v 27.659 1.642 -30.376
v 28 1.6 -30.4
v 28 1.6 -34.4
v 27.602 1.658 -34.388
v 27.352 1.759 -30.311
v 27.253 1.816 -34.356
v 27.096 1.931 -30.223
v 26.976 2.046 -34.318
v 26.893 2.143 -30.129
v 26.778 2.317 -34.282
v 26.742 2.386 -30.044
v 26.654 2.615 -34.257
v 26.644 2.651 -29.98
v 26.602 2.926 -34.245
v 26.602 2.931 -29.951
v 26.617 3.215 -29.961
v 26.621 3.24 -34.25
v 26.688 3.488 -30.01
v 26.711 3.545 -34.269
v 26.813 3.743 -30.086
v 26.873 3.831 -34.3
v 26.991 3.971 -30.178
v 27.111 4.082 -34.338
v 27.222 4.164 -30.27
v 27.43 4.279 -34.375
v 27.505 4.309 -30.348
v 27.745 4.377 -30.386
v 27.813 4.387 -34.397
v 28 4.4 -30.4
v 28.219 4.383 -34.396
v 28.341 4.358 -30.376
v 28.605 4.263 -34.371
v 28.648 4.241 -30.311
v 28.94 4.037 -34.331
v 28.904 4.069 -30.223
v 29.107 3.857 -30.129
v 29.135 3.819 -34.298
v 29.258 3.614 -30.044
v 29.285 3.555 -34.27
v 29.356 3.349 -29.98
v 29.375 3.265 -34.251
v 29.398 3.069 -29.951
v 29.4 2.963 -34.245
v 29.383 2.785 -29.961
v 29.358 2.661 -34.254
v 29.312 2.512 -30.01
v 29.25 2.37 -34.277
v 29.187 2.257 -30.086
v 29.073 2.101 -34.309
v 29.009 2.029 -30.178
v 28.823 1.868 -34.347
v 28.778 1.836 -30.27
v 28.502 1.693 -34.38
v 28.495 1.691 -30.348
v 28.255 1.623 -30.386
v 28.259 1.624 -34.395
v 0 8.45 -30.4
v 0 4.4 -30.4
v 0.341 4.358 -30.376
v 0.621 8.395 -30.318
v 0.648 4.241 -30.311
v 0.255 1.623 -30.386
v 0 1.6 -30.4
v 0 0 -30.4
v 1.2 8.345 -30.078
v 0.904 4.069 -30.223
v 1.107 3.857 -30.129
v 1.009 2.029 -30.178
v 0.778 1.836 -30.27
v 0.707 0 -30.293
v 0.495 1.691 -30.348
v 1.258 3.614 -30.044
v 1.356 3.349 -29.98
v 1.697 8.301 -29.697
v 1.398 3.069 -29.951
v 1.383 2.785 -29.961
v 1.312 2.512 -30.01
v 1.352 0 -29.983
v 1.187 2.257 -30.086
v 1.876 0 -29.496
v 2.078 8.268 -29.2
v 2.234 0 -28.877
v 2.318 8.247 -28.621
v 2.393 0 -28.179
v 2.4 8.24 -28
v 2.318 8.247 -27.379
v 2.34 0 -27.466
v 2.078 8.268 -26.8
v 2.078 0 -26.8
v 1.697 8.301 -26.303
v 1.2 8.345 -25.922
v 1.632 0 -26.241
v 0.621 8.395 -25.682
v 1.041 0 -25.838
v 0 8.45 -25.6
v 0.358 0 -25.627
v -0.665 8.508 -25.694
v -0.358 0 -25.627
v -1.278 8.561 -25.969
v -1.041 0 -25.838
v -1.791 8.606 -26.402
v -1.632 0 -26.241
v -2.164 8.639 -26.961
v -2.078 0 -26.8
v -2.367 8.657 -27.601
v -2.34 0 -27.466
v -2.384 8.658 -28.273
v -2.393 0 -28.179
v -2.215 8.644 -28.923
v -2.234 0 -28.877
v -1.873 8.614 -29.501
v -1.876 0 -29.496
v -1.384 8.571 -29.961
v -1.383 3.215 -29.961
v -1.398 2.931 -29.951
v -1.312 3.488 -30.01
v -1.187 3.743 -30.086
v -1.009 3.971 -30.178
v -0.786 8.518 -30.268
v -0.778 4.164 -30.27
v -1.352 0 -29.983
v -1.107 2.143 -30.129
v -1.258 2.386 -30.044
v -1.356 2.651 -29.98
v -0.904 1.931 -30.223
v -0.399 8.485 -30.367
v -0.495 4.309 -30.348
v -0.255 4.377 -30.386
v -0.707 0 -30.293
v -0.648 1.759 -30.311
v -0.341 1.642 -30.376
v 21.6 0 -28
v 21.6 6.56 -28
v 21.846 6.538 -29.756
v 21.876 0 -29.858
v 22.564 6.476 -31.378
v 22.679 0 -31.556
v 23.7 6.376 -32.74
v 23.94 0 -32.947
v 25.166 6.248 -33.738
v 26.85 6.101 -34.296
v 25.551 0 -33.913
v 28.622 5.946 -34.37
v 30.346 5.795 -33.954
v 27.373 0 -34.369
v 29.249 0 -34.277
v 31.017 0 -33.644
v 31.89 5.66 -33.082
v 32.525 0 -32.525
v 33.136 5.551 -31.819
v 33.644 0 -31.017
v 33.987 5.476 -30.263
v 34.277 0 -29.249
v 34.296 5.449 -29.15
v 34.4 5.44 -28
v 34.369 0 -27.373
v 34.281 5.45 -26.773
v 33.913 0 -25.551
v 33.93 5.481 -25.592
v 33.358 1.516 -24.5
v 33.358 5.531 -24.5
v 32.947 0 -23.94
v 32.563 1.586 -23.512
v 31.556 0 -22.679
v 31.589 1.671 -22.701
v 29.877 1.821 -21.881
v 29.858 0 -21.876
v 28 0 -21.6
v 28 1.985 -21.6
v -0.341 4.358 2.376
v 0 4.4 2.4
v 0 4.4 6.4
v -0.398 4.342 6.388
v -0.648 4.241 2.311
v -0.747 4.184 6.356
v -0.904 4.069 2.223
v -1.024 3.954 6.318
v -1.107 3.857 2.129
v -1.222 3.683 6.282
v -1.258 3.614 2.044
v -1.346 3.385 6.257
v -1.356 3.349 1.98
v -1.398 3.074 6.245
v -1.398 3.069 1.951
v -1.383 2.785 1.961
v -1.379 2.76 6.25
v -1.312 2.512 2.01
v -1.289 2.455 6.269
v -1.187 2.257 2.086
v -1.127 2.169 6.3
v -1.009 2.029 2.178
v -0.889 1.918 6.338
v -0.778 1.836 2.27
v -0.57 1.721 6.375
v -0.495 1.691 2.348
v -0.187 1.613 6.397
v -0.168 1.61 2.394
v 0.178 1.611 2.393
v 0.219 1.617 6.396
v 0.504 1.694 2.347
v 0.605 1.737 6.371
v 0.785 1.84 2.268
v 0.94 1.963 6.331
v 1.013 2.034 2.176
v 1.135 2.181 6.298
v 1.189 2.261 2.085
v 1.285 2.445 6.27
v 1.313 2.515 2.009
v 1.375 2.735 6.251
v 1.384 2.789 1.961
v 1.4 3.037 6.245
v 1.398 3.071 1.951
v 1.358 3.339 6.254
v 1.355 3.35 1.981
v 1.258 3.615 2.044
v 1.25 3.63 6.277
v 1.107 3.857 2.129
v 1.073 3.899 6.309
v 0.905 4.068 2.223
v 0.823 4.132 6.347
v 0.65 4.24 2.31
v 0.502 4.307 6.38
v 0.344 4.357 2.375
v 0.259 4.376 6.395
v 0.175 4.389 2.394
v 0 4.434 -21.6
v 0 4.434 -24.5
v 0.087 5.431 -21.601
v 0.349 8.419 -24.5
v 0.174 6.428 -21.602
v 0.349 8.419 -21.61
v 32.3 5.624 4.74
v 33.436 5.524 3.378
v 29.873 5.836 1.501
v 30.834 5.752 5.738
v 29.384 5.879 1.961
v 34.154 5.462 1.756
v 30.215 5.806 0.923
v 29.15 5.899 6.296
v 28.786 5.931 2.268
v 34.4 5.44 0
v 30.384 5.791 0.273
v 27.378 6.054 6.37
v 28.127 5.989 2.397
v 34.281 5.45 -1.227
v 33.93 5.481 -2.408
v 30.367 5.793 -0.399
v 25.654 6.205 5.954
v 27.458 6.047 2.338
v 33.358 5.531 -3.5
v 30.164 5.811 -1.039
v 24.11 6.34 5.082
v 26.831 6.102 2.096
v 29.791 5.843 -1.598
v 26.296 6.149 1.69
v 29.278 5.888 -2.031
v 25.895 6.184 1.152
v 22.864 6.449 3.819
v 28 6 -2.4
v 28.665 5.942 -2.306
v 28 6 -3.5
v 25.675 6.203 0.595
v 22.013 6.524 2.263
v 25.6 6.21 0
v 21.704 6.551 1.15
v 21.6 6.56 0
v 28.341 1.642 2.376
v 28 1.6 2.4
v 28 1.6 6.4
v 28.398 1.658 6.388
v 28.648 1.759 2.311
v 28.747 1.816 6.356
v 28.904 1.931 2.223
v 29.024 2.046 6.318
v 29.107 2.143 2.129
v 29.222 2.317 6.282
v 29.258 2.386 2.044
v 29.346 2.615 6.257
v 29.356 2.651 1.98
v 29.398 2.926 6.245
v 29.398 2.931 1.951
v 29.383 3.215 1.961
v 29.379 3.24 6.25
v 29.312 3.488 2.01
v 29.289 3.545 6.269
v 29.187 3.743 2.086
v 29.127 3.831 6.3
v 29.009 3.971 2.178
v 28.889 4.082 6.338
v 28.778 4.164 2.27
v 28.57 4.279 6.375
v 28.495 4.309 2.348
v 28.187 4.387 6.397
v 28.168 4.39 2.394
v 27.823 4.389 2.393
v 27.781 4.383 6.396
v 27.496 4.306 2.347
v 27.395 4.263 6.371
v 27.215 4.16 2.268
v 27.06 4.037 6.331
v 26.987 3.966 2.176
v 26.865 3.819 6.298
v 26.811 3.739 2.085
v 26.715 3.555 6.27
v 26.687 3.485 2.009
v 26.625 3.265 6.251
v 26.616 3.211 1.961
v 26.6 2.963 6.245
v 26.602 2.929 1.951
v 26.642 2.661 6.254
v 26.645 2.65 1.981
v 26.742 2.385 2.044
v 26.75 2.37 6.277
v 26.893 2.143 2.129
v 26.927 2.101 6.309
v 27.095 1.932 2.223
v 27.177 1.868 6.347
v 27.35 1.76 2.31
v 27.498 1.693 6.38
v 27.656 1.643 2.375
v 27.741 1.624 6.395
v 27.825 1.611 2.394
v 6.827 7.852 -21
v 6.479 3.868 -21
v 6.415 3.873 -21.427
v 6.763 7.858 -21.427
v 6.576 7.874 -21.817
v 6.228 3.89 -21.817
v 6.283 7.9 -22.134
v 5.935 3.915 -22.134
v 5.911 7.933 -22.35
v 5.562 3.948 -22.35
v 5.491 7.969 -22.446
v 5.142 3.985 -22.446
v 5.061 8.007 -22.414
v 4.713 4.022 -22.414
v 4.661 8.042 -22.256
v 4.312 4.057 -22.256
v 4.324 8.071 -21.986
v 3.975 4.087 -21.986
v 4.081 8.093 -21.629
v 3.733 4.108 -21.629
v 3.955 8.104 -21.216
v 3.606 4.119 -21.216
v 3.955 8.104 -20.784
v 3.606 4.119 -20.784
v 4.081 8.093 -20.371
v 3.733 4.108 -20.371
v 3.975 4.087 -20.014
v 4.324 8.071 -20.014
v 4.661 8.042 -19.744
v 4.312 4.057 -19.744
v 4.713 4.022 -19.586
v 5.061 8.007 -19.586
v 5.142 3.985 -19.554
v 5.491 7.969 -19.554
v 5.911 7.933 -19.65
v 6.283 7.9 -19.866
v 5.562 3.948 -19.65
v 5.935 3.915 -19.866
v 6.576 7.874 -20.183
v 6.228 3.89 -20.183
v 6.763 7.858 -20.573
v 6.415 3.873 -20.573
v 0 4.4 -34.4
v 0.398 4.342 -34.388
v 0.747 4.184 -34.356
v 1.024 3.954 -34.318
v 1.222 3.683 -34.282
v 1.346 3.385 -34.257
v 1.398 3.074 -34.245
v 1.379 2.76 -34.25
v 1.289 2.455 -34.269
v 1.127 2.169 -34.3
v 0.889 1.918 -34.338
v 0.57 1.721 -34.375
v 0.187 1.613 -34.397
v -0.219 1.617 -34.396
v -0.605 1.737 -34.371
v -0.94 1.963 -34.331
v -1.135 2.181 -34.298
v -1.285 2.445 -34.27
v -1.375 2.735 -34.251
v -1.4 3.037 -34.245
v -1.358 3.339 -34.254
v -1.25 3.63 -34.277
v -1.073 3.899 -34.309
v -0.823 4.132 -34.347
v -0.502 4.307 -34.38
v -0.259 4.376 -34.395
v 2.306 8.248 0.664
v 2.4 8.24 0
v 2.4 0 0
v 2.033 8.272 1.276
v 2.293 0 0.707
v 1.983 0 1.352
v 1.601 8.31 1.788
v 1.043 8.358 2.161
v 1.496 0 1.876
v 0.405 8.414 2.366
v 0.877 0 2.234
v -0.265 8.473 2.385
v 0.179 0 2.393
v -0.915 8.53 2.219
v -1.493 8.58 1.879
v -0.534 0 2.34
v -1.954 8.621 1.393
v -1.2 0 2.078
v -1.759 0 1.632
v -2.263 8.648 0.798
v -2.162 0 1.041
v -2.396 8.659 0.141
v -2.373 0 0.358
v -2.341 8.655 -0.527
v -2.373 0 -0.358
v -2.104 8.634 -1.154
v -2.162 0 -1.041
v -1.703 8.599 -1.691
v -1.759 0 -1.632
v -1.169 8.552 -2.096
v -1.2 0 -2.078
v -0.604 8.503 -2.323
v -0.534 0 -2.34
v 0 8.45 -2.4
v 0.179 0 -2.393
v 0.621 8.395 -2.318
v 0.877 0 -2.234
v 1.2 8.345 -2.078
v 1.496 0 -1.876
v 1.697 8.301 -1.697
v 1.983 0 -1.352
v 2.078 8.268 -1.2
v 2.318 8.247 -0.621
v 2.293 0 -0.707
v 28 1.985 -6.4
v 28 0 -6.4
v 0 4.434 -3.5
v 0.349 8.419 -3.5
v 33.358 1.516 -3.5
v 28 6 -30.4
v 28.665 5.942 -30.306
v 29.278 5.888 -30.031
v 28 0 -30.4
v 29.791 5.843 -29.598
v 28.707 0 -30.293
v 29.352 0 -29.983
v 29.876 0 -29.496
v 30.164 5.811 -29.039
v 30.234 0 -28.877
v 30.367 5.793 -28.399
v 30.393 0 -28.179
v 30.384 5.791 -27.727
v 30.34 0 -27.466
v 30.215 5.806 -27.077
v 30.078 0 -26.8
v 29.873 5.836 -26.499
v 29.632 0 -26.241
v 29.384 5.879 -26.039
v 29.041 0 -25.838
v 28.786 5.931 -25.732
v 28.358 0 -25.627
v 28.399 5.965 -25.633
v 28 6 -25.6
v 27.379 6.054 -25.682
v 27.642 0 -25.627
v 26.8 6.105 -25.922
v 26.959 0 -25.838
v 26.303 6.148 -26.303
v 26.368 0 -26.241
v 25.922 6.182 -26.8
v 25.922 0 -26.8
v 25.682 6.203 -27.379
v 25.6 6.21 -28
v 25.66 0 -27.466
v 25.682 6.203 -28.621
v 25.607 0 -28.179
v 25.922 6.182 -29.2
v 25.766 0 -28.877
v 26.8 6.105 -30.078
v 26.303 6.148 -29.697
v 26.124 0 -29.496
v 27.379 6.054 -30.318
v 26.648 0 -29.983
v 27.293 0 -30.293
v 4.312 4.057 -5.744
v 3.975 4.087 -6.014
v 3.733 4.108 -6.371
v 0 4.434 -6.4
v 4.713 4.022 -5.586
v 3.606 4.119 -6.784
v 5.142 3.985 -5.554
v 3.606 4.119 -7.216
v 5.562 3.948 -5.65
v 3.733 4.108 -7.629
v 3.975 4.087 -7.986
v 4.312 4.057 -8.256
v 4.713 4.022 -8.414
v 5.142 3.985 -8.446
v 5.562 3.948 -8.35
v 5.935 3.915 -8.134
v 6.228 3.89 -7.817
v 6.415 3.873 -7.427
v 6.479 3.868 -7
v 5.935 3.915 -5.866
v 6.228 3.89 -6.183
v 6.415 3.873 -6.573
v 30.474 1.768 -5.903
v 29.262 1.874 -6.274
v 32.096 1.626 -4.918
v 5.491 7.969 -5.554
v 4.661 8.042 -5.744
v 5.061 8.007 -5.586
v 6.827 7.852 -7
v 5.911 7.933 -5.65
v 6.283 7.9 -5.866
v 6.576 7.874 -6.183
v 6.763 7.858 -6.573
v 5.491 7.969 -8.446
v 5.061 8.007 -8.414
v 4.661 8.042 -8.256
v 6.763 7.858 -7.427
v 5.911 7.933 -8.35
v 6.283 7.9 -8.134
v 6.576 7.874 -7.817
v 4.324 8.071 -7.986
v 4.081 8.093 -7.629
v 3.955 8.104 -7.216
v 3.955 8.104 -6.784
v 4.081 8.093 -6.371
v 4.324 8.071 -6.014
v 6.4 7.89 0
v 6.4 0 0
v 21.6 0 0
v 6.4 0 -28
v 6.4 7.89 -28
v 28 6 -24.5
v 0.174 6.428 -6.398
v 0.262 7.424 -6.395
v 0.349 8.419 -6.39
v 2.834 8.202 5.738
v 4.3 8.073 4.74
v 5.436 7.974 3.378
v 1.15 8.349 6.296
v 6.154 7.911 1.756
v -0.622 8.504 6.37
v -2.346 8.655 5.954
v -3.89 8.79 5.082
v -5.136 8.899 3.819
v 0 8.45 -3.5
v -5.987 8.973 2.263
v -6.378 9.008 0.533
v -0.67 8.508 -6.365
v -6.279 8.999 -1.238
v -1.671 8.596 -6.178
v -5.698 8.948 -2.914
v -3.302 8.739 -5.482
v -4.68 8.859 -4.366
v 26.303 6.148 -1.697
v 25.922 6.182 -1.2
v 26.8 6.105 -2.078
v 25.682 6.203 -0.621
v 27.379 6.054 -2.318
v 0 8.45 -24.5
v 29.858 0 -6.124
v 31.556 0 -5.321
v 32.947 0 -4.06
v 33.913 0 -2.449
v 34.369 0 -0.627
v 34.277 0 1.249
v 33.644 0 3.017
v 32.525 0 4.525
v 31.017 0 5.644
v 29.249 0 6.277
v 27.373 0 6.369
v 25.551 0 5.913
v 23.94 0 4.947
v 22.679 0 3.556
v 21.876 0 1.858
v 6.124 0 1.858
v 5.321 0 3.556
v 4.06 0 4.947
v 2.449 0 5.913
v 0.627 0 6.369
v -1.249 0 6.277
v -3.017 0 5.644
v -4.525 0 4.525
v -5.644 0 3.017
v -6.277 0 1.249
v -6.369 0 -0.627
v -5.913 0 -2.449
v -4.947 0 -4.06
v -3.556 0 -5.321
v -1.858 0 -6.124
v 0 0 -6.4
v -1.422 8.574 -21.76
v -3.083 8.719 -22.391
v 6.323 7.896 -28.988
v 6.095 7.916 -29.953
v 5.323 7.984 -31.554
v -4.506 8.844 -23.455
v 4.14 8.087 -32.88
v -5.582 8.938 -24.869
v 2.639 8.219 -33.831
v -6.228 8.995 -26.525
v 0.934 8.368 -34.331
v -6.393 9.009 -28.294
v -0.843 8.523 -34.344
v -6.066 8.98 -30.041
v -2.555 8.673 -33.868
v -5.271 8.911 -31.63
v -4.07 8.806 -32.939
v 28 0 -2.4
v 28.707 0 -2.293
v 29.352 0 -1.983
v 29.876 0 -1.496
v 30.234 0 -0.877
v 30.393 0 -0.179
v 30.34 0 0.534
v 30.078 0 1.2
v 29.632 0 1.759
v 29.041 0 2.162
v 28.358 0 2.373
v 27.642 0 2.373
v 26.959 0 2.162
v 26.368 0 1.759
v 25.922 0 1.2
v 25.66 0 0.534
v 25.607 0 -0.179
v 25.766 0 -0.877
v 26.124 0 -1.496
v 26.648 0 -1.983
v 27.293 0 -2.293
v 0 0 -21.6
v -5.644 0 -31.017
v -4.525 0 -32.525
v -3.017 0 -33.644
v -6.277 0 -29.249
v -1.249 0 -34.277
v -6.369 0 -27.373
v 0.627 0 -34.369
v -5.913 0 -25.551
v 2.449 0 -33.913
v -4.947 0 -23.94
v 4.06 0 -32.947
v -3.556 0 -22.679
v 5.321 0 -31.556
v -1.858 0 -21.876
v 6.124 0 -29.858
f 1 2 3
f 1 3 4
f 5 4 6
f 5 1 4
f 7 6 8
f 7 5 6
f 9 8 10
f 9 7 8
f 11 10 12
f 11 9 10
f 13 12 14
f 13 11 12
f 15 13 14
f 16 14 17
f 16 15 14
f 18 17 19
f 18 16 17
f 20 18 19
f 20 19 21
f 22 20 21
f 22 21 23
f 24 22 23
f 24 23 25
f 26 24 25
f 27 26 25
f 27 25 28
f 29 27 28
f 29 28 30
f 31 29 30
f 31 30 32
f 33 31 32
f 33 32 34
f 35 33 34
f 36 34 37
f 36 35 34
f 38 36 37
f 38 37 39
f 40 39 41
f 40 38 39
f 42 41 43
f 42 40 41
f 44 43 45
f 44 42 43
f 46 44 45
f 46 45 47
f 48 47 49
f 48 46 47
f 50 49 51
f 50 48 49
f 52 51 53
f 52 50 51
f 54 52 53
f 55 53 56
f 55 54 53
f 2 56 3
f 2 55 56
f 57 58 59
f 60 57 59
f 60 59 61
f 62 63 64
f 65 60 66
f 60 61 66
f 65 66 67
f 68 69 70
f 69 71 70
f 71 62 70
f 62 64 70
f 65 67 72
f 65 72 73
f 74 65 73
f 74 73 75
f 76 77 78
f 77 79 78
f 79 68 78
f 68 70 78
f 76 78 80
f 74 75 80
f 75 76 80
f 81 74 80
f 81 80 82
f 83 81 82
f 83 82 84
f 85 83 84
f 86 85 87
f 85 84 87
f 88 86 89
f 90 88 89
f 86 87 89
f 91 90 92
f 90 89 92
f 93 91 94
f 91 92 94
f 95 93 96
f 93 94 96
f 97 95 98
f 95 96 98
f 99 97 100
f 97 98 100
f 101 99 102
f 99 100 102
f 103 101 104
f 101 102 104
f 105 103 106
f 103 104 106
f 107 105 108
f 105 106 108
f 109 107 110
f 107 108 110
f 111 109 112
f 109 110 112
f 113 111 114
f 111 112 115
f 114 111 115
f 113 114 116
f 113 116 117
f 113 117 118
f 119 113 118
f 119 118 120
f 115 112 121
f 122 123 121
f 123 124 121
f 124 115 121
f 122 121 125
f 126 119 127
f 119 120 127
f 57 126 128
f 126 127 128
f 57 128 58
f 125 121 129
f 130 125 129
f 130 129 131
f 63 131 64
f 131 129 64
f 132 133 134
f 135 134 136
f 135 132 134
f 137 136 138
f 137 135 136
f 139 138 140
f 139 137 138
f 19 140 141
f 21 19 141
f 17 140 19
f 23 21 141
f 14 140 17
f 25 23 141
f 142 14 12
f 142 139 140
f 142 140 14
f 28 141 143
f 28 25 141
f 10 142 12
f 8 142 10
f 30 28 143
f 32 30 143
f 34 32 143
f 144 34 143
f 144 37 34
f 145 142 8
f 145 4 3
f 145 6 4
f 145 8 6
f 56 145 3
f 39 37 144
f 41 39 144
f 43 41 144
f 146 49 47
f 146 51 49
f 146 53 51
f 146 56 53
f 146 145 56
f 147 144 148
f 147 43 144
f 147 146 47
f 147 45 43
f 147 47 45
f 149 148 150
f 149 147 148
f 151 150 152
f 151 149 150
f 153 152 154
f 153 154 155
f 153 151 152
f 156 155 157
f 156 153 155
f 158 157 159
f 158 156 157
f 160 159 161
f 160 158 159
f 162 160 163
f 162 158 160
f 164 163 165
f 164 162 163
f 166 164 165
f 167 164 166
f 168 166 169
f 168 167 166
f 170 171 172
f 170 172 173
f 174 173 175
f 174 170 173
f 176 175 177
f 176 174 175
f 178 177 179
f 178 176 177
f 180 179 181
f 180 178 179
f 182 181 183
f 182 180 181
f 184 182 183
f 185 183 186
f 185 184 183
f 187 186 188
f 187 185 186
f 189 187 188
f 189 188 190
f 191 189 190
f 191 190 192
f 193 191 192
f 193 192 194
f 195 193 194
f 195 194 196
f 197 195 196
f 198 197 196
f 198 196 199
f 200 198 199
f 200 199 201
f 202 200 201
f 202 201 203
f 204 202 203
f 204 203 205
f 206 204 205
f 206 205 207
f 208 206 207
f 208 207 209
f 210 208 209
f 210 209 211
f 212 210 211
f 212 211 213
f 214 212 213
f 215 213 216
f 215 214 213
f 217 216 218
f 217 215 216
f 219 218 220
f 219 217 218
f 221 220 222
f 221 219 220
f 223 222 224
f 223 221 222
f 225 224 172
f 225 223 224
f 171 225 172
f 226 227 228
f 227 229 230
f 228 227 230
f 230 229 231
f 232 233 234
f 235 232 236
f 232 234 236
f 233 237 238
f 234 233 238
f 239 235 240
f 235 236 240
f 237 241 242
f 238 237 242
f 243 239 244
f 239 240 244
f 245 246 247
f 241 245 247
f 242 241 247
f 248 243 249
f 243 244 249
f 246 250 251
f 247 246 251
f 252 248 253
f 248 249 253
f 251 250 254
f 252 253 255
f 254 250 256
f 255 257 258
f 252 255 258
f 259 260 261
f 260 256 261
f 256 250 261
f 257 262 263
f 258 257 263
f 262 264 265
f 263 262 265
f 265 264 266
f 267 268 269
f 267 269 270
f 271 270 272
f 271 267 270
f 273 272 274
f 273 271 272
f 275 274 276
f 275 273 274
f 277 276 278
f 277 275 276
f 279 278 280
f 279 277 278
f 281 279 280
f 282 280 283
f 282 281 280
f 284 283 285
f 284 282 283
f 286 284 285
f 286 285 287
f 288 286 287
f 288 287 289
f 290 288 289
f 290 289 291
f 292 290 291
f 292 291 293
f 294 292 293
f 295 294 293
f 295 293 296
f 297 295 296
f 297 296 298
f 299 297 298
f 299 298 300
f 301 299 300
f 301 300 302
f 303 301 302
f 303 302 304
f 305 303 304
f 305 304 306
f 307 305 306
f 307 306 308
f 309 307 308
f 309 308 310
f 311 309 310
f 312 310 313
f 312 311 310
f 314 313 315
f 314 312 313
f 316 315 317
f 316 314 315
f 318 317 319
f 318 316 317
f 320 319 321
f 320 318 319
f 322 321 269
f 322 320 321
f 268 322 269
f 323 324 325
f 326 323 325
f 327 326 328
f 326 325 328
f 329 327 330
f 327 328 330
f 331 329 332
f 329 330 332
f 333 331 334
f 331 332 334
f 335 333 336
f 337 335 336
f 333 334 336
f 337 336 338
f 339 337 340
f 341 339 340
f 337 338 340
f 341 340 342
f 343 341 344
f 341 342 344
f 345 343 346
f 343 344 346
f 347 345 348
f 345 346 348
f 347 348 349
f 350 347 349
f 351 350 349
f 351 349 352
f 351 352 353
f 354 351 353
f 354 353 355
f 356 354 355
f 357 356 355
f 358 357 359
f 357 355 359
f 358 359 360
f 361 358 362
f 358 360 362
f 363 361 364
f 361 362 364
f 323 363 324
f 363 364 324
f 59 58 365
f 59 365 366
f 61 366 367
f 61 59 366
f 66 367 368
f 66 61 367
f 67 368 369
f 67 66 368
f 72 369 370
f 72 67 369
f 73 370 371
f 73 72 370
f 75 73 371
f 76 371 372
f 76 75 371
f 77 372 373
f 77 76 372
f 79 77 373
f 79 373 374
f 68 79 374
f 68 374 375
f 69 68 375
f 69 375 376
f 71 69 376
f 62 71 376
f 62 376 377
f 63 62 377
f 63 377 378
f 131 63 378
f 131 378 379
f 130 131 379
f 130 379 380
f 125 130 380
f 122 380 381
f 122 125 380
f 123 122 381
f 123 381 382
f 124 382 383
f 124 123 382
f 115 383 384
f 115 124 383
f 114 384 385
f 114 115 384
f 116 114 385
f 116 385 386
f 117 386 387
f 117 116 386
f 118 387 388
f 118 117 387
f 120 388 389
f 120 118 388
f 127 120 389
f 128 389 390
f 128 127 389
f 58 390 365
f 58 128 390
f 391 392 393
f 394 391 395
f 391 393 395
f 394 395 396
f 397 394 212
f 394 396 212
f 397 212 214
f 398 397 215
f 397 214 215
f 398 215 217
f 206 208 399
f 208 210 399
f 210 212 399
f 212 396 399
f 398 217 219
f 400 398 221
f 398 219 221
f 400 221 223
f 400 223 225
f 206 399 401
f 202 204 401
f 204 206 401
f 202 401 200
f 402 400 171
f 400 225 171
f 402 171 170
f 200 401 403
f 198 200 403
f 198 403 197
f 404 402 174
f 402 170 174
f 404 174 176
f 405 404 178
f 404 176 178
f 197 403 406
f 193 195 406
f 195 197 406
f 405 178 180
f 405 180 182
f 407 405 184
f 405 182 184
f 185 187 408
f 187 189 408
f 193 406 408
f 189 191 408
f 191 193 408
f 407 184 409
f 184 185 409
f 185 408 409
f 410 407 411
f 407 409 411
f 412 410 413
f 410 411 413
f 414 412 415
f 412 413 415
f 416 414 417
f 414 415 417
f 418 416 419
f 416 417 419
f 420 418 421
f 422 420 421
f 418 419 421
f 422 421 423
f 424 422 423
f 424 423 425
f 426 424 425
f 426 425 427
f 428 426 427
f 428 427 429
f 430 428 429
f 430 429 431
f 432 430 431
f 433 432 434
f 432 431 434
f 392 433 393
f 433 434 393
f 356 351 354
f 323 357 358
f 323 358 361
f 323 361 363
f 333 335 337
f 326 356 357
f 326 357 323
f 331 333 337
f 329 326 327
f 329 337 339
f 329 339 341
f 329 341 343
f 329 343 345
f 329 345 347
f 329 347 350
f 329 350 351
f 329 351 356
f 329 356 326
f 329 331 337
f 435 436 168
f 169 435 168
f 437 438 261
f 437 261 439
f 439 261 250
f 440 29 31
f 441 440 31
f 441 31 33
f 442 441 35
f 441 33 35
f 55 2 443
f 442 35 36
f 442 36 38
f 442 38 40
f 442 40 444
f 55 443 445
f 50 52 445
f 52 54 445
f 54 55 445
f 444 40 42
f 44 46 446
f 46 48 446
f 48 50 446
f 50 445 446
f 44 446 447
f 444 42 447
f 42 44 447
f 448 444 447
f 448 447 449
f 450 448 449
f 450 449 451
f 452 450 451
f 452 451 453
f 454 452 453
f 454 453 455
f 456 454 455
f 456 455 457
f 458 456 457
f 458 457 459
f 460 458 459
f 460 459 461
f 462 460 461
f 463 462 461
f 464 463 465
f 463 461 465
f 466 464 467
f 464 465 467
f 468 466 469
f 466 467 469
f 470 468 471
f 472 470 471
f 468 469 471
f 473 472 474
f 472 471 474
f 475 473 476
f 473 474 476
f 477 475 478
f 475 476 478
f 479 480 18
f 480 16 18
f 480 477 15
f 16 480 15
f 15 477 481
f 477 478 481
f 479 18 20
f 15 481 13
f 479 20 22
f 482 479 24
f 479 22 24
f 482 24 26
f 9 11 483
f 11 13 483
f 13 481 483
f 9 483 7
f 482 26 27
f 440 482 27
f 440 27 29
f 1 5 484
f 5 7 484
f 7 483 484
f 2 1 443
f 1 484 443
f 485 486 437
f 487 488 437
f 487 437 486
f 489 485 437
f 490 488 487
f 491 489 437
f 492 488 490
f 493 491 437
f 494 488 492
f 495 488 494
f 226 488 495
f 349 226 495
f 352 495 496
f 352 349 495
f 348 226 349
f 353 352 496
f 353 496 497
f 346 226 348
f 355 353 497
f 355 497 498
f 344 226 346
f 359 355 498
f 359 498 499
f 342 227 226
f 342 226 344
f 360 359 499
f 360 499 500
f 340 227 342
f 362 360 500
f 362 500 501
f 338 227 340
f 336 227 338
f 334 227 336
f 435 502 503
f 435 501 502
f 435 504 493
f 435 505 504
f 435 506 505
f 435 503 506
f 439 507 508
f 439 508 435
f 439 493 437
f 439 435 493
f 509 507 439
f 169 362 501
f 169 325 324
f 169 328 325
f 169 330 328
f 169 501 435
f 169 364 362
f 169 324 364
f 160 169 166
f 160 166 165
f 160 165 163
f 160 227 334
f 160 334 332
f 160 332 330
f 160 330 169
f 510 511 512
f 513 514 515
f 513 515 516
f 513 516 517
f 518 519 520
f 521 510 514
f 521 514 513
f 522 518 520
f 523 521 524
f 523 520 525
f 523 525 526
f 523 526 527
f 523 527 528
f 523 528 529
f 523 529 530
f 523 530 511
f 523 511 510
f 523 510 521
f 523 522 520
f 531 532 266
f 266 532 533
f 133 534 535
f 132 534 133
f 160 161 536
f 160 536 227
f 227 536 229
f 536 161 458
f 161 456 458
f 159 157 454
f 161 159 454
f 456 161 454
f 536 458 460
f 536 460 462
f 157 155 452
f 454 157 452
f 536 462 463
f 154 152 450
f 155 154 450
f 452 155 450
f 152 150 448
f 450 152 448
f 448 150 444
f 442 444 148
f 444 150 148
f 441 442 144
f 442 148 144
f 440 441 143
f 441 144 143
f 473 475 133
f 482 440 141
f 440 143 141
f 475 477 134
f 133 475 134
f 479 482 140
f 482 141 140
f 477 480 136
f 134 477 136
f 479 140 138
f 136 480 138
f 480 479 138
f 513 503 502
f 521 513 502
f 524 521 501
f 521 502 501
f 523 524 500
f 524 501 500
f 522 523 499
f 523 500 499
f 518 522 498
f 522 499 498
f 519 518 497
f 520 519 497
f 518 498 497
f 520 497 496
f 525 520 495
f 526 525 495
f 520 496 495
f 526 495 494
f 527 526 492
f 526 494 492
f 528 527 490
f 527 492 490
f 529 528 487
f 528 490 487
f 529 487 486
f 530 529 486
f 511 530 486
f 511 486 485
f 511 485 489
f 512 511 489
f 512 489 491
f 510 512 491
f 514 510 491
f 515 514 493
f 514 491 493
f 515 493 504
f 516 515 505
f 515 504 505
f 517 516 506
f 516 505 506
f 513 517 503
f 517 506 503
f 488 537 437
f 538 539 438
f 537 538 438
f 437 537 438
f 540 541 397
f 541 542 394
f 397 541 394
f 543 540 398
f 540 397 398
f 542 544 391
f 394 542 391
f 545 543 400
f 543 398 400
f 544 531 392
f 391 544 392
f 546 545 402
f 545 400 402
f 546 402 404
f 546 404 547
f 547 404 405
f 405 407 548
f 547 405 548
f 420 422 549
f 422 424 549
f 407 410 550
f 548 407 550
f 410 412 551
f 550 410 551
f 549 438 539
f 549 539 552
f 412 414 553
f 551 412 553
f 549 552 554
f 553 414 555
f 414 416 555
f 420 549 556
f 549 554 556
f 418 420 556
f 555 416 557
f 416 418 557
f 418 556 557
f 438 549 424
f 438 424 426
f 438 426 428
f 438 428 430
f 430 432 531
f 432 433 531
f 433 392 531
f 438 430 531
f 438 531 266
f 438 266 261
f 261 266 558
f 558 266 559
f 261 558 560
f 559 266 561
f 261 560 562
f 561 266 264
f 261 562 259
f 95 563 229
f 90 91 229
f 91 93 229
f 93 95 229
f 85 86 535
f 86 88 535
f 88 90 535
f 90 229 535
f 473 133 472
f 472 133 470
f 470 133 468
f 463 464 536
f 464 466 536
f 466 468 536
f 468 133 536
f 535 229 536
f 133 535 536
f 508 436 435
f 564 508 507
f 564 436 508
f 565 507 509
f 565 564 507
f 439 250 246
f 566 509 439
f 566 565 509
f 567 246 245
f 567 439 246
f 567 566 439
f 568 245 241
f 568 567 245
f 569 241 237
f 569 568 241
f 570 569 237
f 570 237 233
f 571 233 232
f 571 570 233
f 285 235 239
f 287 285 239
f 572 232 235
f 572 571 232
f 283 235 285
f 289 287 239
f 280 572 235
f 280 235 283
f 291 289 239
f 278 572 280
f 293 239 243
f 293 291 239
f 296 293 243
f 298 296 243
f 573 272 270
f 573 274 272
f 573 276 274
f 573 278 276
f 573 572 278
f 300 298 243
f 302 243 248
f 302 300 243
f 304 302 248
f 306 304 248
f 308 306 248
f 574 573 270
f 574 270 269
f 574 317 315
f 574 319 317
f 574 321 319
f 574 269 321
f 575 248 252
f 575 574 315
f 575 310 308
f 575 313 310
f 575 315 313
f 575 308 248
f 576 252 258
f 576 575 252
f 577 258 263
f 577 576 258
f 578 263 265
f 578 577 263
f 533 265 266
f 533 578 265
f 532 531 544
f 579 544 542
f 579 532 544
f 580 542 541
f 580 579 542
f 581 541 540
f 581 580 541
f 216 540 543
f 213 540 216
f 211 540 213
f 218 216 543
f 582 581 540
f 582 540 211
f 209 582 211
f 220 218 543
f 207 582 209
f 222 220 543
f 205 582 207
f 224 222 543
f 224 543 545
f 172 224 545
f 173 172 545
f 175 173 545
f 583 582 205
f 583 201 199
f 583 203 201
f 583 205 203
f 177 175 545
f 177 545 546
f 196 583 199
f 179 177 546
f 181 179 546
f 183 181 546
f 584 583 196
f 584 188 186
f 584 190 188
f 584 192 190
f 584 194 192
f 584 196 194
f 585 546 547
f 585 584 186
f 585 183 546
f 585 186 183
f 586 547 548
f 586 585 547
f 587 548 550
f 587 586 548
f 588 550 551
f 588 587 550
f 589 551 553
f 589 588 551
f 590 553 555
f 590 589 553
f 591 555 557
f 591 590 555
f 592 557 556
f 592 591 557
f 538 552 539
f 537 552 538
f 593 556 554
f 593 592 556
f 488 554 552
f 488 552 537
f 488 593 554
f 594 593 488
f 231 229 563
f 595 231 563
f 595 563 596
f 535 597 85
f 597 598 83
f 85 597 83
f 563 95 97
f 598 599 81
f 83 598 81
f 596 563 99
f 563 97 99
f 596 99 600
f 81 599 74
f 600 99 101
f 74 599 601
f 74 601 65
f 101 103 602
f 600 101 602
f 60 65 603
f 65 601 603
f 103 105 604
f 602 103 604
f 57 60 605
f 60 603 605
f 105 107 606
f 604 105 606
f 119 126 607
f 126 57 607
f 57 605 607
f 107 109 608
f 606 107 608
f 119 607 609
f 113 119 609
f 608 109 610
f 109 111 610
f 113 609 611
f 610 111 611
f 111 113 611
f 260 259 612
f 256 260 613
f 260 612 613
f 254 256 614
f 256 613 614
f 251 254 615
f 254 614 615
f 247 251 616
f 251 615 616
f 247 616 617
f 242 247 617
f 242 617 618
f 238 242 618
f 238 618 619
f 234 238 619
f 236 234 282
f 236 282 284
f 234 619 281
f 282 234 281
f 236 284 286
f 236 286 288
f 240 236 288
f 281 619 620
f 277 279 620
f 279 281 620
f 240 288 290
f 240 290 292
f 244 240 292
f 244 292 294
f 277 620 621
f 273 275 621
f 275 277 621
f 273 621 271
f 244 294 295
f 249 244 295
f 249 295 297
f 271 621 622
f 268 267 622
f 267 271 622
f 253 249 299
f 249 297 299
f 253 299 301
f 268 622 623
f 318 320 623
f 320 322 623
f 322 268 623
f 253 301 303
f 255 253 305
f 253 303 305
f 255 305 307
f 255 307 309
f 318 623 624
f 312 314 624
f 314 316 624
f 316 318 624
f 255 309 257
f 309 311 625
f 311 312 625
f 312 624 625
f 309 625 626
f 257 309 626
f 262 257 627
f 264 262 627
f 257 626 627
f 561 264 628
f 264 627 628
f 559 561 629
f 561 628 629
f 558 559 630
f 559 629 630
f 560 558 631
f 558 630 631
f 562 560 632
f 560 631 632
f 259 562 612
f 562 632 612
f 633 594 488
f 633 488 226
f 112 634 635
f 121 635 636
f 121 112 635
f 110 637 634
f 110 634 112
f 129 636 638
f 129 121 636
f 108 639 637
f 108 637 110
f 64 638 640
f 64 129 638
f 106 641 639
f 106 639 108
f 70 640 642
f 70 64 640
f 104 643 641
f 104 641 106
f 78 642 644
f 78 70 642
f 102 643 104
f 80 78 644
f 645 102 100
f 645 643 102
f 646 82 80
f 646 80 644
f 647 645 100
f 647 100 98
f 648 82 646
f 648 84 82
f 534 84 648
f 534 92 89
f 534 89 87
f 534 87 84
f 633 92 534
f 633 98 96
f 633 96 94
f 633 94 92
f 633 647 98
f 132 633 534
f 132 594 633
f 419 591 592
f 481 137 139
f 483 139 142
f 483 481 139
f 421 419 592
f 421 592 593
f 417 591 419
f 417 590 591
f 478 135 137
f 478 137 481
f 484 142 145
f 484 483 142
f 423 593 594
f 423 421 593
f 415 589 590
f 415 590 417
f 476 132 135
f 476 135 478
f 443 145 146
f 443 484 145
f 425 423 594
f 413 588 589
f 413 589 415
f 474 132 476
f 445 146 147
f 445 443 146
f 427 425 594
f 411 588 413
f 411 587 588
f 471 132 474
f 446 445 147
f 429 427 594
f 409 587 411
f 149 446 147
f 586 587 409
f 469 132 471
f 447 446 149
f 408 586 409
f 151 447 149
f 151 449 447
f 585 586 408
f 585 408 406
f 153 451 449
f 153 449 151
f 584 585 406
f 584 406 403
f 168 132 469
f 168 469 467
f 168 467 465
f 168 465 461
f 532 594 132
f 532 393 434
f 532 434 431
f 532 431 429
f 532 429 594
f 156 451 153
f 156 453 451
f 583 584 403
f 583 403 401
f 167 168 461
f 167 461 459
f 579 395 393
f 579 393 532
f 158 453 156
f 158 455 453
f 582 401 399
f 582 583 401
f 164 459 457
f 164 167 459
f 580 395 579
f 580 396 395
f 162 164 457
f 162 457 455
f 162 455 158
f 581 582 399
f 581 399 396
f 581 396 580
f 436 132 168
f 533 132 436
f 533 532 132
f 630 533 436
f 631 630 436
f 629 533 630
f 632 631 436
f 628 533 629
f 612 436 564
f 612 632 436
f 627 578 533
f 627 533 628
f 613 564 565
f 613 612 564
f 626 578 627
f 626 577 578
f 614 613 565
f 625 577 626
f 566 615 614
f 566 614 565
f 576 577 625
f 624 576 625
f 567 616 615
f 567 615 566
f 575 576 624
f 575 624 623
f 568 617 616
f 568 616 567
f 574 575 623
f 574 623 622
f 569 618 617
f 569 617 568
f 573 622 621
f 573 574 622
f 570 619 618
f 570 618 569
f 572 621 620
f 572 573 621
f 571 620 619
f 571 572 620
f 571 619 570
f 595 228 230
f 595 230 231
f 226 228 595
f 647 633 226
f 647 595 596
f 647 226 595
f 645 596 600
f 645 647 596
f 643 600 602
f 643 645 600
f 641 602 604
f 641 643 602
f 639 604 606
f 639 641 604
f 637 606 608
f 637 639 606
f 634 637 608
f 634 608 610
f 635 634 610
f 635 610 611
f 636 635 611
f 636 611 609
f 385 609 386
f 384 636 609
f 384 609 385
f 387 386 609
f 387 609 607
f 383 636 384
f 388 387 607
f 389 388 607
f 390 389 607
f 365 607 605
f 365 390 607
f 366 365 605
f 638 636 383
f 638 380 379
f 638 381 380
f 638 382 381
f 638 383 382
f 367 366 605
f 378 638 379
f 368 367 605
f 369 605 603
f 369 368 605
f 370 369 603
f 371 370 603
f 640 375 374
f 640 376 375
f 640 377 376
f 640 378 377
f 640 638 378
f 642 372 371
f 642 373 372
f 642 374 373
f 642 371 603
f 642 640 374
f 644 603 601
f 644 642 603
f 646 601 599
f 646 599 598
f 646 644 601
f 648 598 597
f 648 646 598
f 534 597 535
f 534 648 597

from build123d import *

# Parameters (mm, degrees)
SKETCH1_W           = 28
SKETCH1_H           = 28
BOSS_EXTRUDE1_DEPTH = 8.449682579
CUT_EXTRUDE1_DEPTH  = 41.489469442
SKETCH3_W           = 50
SKETCH3_H           = 21
CUT_EXTRUDE2_DEPTH  = 4
SKETCH11_R          = 1.45
BOSS_EXTRUDE2_DEPTH = 4
SKETCH13_R          = 2.4
CUT_EXTRUDE5_DEPTH  = 41.489469442
BOSS_EXTRUDE3_REACH = 42.489
SKETCH14_R          = 6.4
SKETCH14_R_2        = 2.4
SKETCH15_R          = 1.4
CUT_EXTRUDE6_DEPTH  = 50.476186927
SKETCH16_R          = 1.4
CUT_EXTRUDE7_DEPTH  = 50.476187084
SKETCH18_W          = 30
SKETCH18_H          = 21
CUT_EXTRUDE8_DEPTH  = 4


with BuildPart() as part:
    # Sketch1 → Boss-Extrude1 (new body)
    with BuildSketch(Plane(origin=(0, 0, 0), x_dir=(1, 0, 0), z_dir=(0, 1, 0))):
        with Locations((14, 14)):
            Rectangle(SKETCH1_W, SKETCH1_H)
    extrude(amount=BOSS_EXTRUDE1_DEPTH)

    # Sketch2 → Cut-Extrude1 (cut, through all)
    with BuildSketch(Plane.XY):
        Polygon((0, 8.449682579), (28, 6), (28, 8.449682579), align=None)
    extrude(amount=-CUT_EXTRUDE1_DEPTH, mode=Mode.SUBTRACT)

    # Sketch3 → Cut-Extrude2 (cut)
    with BuildSketch(Plane(origin=(0.733635991, 8.385497746, 0), x_dir=(0.9961946980917455, -0.08715574274765811, 0), z_dir=(0.08715574274765811, 0.9961946980917455, 0))):
        with Locations((24.263561639, 14)):
            Rectangle(SKETCH3_W, SKETCH3_H)
    extrude(amount=-CUT_EXTRUDE2_DEPTH, mode=Mode.SUBTRACT)

    # Sketch11 → Boss-Extrude2 (add)
    with BuildSketch(Plane(origin=(0.38501302, 4.400718954, 0), x_dir=(0.9961946980917457, -0.08715574274765812, 0), z_dir=(0.08715574274765812, 0.9961946980917457, 0))):
        with Locations((4.666994019, 21)):
            Circle(SKETCH11_R)
        with Locations((4.666994019, 7)):
            Circle(SKETCH11_R)
    extrude(amount=BOSS_EXTRUDE2_DEPTH)

    # Sketch13 → Cut-Extrude5 (cut, through all)
    with BuildSketch(Plane.XZ):
        Circle(SKETCH13_R)
        with Locations((28, 0)):
            Circle(SKETCH13_R)
        with Locations((28, -28)):
            Circle(SKETCH13_R)
        with Locations((0, -28)):
            Circle(SKETCH13_R)
    extrude(amount=-CUT_EXTRUDE5_DEPTH, mode=Mode.SUBTRACT)

    # Boss-Extrude3: up to this plane
    boss_extrude3_end = Plane(origin=(0, 8.449682579, -28), z_dir=(-0.08715574274765814, -0.9961946980917457, 0))
    # Sketch14 → Boss-Extrude3 (add, up to the surface)
    with BuildSketch(Plane.XZ, mode=Mode.PRIVATE) as boss_extrude3_sk1:
        Circle(SKETCH14_R)
        with Locations(Location((0, 0, 0), (0, 0, 270))):
            Circle(SKETCH14_R_2, mode=Mode.SUBTRACT)
    boss_extrude3_tool1 = split(extrude(boss_extrude3_sk1.sketch, amount=-BOSS_EXTRUDE3_REACH, mode=Mode.PRIVATE), bisect_by=boss_extrude3_end, keep=Keep.BOTH, mode=Mode.PRIVATE)
    add(boss_extrude3_tool1.solids().sort_by_distance((-6.218981, 0, 0))[0])
    # Sketch14 → Boss-Extrude3 (add, up to the surface)
    with BuildSketch(Plane.XZ, mode=Mode.PRIVATE) as boss_extrude3_sk2:
        with Locations((28, 0)):
            Circle(SKETCH14_R)
        with Locations(Location((28, 0, 0), (0, 0, 270))):
            Circle(SKETCH14_R_2, mode=Mode.SUBTRACT)
    boss_extrude3_tool2 = split(extrude(boss_extrude3_sk2.sketch, amount=-BOSS_EXTRUDE3_REACH, mode=Mode.PRIVATE), bisect_by=boss_extrude3_end, keep=Keep.BOTH, mode=Mode.PRIVATE)
    add(boss_extrude3_tool2.solids().sort_by_distance((21.781019, 0, 0))[0])
    # Sketch14 → Boss-Extrude3 (add, up to the surface)
    with BuildSketch(Plane.XZ, mode=Mode.PRIVATE) as boss_extrude3_sk3:
        with Locations((28, -28)):
            Circle(SKETCH14_R)
        with Locations(Location((28, -28, 0), (0, 0, 270))):
            Circle(SKETCH14_R_2, mode=Mode.SUBTRACT)
    boss_extrude3_tool3 = split(extrude(boss_extrude3_sk3.sketch, amount=-BOSS_EXTRUDE3_REACH, mode=Mode.PRIVATE), bisect_by=boss_extrude3_end, keep=Keep.BOTH, mode=Mode.PRIVATE)
    add(boss_extrude3_tool3.solids().sort_by_distance((21.781019, 0, -28))[0])
    # Sketch14 → Boss-Extrude3 (add, up to the surface)
    with BuildSketch(Plane.XZ, mode=Mode.PRIVATE) as boss_extrude3_sk4:
        with Locations((0, -28)):
            Circle(SKETCH14_R)
        with Locations(Location((0, -28, 0), (0, 0, 270))):
            Circle(SKETCH14_R_2, mode=Mode.SUBTRACT)
    boss_extrude3_tool4 = split(extrude(boss_extrude3_sk4.sketch, amount=-BOSS_EXTRUDE3_REACH, mode=Mode.PRIVATE), bisect_by=boss_extrude3_end, keep=Keep.BOTH, mode=Mode.PRIVATE)
    add(boss_extrude3_tool4.solids().sort_by_distance((-6.218981, 0, -28))[0])

    # Sketch15 → Cut-Extrude6 (cut, through all)
    with BuildSketch(Plane(origin=(0, 0, -28), x_dir=(-1, 0, 0), z_dir=(0, 0, -1))):
        with Locations(Location((-28, 3, 0), (0, 0, 270))):
            Circle(SKETCH15_R)
        with Locations(Location((0, 3, 0), (0, 0, 90))):
            Circle(SKETCH15_R)
    extrude(amount=CUT_EXTRUDE6_DEPTH, mode=Mode.SUBTRACT)

    # Sketch16 → Cut-Extrude7 (cut, through all)
    with BuildSketch(Plane.XY):
        with Locations(Location((0, 3, 0), (0, 0, 90))):
            Circle(SKETCH16_R)
        with Locations(Location((28, 3, 0), (0, 0, 270))):
            Circle(SKETCH16_R)
    extrude(amount=CUT_EXTRUDE7_DEPTH, mode=Mode.SUBTRACT)

    # Sketch18 → Cut-Extrude8 (cut)
    with BuildSketch(Plane(origin=(0.733635991, 8.385497746, 0), x_dir=(0.9961946980917455, -0.08715574274765811, 0), z_dir=(0.08715574274765811, 0.9961946980917455, 0))):
        with BuildLine():
            Line((4.992154967, 24.5), (-0.386483707, 24.5))
            Line((-0.386483707, 24.5), (-0.386483707, 21.6))
            add(Edge.make_bspline(
                [(-0.386483707, 21.6), (3.090616042, 21.6), (4.992154967, 24.5)],
                knots=[4.71238898, 4.71238898, 4.71238898, 5.704558256, 5.704558256, 5.704558256], degree=2, weights=[1, 0.879452955, 1]))
        make_face()
        with Locations((21.991878416, 14)):
            Rectangle(SKETCH18_W, SKETCH18_H)
        with BuildLine():
            Line((-0.386483707, 6.4), (-0.386483707, 3.5))
            Line((-0.386483707, 3.5), (4.992154967, 3.5))
            add(Edge.make_bspline(
                [(4.992154967, 3.5), (3.090616042, 6.4), (-0.386483707, 6.4)],
                knots=[0.578627051, 0.578627051, 0.578627051, 1.570796327, 1.570796327, 1.570796327], degree=2, weights=[1, 0.879452955, 1]))
        make_face()
    extrude(amount=-CUT_EXTRUDE8_DEPTH, mode=Mode.SUBTRACT)


solid = part.part
